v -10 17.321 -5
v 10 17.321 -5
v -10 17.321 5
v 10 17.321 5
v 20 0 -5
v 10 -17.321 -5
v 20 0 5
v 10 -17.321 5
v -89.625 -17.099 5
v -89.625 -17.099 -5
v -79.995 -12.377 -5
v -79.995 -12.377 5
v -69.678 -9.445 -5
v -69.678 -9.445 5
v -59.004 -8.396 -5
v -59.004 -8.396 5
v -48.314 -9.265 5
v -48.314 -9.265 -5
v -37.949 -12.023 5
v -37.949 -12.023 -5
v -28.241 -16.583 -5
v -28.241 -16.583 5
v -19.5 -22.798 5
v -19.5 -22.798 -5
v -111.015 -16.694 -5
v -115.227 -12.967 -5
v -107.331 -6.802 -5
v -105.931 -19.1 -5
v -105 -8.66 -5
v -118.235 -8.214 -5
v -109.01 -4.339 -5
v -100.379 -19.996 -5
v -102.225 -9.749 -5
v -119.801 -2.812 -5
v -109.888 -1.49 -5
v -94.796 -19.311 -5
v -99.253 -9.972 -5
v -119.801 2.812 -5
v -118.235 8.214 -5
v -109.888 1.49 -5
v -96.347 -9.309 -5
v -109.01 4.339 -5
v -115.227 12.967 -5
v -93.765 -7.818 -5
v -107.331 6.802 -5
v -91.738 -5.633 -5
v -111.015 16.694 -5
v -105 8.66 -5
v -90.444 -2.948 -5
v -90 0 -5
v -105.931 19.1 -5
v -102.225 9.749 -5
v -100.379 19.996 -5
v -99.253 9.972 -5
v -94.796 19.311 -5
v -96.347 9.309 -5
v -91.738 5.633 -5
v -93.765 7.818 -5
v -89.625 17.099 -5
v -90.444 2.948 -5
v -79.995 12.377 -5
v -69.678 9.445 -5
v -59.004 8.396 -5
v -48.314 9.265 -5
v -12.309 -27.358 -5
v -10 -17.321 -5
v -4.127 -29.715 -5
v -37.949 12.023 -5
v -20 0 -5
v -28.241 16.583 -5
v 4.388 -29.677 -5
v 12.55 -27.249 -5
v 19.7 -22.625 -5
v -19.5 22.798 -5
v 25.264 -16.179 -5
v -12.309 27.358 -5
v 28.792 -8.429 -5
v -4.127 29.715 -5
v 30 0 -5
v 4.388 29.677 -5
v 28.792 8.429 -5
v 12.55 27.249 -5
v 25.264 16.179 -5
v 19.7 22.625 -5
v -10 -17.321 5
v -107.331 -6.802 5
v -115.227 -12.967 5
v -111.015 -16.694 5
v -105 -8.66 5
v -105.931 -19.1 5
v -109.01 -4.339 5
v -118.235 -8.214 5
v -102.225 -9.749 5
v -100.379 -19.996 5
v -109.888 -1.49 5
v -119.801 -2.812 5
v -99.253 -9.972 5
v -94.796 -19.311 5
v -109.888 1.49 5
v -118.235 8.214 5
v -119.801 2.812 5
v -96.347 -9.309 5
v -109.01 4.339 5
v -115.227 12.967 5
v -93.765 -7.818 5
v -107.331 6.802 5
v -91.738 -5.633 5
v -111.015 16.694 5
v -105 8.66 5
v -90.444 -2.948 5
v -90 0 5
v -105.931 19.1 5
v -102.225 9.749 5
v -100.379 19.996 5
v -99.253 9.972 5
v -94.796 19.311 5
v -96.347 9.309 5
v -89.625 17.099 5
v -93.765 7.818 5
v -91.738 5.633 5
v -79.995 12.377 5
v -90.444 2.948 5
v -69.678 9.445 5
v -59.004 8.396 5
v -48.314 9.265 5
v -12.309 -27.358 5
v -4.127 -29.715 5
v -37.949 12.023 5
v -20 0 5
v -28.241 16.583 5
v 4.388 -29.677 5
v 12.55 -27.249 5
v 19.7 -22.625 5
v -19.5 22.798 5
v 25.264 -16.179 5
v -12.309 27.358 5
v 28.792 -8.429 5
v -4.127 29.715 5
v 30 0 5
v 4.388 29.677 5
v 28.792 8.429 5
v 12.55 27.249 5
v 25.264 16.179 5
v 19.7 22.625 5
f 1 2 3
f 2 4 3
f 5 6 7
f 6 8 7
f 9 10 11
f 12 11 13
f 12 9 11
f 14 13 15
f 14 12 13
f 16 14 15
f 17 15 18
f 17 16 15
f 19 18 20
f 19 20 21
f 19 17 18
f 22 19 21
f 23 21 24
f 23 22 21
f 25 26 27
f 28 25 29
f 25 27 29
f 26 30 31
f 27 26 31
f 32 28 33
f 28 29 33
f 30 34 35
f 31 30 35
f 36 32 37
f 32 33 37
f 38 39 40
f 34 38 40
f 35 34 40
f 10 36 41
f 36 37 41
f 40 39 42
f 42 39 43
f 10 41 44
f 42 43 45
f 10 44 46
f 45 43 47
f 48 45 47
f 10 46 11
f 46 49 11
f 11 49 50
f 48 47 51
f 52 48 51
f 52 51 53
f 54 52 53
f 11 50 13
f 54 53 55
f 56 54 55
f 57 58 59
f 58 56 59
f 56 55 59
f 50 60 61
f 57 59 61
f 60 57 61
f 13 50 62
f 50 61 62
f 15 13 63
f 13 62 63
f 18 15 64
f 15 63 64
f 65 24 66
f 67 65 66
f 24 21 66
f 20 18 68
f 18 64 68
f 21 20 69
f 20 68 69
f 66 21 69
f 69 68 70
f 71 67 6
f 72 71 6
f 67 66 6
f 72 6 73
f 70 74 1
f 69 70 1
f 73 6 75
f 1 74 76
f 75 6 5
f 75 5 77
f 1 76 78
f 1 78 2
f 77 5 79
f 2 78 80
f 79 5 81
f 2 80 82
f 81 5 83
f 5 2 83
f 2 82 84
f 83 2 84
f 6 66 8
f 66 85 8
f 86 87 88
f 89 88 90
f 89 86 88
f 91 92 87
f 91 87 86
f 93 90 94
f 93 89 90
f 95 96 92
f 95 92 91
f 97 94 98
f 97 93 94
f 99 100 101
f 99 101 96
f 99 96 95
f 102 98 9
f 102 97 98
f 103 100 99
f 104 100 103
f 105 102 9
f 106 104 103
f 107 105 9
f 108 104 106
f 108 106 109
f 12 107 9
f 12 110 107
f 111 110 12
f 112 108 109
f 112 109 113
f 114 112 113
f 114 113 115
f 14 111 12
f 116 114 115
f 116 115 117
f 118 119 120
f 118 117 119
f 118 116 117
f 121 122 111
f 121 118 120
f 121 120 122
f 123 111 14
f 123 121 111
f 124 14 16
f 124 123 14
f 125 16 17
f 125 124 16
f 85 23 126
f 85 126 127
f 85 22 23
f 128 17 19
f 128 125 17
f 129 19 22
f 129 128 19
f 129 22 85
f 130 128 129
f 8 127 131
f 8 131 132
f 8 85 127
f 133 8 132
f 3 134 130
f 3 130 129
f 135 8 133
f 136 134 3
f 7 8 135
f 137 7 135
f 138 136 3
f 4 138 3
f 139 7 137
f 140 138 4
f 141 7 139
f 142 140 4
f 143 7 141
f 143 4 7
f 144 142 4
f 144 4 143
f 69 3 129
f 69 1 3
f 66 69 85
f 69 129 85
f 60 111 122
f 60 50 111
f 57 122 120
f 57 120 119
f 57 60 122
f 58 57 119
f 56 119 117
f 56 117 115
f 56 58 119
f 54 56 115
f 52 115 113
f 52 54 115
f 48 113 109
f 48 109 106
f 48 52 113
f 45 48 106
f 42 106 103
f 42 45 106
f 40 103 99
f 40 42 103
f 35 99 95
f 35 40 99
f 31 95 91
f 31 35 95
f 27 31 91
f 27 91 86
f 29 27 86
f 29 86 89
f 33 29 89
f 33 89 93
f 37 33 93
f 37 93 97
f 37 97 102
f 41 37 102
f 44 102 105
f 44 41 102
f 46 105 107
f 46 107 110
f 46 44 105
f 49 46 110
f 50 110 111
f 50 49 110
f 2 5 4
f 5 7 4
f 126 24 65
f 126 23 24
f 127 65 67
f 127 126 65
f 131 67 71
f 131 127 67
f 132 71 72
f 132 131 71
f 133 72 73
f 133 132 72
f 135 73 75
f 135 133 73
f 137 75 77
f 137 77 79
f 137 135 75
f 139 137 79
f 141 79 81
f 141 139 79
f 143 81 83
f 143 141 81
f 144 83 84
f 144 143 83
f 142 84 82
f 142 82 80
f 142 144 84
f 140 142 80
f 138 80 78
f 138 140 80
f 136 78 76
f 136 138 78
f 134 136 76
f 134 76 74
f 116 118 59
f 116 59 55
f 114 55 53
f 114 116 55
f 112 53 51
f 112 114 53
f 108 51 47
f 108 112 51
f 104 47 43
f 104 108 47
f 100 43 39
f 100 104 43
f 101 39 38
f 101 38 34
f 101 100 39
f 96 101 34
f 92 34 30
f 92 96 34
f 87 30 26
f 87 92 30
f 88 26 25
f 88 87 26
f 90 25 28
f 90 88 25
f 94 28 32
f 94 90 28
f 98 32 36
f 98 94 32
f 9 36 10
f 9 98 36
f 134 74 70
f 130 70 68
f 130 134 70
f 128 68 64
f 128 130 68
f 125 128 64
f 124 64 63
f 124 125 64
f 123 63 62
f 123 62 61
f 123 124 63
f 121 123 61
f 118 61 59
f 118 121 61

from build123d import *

# Parameters (mm, degrees)
SKETCH1_R           = 10
BOSS_EXTRUDE1_DEPTH = 5


with BuildPart() as part:
    # Sketch1 → Boss-Extrude1 (new, symmetric)
    with BuildSketch(Plane.XY):
        with BuildLine():
            ThreePointArc((-19.5, -22.79802623), (30, 0), (-19.5, 22.79802623))
            ThreePointArc((-19.5, 22.79802623), (-53.639444476, 8.591277753), (-89.625, 17.098519673))
            ThreePointArc((-89.625, 17.098519673), (-120, 0), (-89.625, -17.098519673))
            ThreePointArc((-89.625, -17.098519673), (-53.639444476, -8.591277753), (-19.5, -22.79802623))
        make_face()
        with Locations((-100, 0)):
            Circle(SKETCH1_R, mode=Mode.SUBTRACT)
        Polygon((-20, 0), (-10, -17.320508076), (10, -17.320508076), (20, 0), (10, 17.320508076), (-10, 17.320508076), align=None, mode=Mode.SUBTRACT)
    extrude(amount=BOSS_EXTRUDE1_DEPTH, both=True)


solid = part.part
